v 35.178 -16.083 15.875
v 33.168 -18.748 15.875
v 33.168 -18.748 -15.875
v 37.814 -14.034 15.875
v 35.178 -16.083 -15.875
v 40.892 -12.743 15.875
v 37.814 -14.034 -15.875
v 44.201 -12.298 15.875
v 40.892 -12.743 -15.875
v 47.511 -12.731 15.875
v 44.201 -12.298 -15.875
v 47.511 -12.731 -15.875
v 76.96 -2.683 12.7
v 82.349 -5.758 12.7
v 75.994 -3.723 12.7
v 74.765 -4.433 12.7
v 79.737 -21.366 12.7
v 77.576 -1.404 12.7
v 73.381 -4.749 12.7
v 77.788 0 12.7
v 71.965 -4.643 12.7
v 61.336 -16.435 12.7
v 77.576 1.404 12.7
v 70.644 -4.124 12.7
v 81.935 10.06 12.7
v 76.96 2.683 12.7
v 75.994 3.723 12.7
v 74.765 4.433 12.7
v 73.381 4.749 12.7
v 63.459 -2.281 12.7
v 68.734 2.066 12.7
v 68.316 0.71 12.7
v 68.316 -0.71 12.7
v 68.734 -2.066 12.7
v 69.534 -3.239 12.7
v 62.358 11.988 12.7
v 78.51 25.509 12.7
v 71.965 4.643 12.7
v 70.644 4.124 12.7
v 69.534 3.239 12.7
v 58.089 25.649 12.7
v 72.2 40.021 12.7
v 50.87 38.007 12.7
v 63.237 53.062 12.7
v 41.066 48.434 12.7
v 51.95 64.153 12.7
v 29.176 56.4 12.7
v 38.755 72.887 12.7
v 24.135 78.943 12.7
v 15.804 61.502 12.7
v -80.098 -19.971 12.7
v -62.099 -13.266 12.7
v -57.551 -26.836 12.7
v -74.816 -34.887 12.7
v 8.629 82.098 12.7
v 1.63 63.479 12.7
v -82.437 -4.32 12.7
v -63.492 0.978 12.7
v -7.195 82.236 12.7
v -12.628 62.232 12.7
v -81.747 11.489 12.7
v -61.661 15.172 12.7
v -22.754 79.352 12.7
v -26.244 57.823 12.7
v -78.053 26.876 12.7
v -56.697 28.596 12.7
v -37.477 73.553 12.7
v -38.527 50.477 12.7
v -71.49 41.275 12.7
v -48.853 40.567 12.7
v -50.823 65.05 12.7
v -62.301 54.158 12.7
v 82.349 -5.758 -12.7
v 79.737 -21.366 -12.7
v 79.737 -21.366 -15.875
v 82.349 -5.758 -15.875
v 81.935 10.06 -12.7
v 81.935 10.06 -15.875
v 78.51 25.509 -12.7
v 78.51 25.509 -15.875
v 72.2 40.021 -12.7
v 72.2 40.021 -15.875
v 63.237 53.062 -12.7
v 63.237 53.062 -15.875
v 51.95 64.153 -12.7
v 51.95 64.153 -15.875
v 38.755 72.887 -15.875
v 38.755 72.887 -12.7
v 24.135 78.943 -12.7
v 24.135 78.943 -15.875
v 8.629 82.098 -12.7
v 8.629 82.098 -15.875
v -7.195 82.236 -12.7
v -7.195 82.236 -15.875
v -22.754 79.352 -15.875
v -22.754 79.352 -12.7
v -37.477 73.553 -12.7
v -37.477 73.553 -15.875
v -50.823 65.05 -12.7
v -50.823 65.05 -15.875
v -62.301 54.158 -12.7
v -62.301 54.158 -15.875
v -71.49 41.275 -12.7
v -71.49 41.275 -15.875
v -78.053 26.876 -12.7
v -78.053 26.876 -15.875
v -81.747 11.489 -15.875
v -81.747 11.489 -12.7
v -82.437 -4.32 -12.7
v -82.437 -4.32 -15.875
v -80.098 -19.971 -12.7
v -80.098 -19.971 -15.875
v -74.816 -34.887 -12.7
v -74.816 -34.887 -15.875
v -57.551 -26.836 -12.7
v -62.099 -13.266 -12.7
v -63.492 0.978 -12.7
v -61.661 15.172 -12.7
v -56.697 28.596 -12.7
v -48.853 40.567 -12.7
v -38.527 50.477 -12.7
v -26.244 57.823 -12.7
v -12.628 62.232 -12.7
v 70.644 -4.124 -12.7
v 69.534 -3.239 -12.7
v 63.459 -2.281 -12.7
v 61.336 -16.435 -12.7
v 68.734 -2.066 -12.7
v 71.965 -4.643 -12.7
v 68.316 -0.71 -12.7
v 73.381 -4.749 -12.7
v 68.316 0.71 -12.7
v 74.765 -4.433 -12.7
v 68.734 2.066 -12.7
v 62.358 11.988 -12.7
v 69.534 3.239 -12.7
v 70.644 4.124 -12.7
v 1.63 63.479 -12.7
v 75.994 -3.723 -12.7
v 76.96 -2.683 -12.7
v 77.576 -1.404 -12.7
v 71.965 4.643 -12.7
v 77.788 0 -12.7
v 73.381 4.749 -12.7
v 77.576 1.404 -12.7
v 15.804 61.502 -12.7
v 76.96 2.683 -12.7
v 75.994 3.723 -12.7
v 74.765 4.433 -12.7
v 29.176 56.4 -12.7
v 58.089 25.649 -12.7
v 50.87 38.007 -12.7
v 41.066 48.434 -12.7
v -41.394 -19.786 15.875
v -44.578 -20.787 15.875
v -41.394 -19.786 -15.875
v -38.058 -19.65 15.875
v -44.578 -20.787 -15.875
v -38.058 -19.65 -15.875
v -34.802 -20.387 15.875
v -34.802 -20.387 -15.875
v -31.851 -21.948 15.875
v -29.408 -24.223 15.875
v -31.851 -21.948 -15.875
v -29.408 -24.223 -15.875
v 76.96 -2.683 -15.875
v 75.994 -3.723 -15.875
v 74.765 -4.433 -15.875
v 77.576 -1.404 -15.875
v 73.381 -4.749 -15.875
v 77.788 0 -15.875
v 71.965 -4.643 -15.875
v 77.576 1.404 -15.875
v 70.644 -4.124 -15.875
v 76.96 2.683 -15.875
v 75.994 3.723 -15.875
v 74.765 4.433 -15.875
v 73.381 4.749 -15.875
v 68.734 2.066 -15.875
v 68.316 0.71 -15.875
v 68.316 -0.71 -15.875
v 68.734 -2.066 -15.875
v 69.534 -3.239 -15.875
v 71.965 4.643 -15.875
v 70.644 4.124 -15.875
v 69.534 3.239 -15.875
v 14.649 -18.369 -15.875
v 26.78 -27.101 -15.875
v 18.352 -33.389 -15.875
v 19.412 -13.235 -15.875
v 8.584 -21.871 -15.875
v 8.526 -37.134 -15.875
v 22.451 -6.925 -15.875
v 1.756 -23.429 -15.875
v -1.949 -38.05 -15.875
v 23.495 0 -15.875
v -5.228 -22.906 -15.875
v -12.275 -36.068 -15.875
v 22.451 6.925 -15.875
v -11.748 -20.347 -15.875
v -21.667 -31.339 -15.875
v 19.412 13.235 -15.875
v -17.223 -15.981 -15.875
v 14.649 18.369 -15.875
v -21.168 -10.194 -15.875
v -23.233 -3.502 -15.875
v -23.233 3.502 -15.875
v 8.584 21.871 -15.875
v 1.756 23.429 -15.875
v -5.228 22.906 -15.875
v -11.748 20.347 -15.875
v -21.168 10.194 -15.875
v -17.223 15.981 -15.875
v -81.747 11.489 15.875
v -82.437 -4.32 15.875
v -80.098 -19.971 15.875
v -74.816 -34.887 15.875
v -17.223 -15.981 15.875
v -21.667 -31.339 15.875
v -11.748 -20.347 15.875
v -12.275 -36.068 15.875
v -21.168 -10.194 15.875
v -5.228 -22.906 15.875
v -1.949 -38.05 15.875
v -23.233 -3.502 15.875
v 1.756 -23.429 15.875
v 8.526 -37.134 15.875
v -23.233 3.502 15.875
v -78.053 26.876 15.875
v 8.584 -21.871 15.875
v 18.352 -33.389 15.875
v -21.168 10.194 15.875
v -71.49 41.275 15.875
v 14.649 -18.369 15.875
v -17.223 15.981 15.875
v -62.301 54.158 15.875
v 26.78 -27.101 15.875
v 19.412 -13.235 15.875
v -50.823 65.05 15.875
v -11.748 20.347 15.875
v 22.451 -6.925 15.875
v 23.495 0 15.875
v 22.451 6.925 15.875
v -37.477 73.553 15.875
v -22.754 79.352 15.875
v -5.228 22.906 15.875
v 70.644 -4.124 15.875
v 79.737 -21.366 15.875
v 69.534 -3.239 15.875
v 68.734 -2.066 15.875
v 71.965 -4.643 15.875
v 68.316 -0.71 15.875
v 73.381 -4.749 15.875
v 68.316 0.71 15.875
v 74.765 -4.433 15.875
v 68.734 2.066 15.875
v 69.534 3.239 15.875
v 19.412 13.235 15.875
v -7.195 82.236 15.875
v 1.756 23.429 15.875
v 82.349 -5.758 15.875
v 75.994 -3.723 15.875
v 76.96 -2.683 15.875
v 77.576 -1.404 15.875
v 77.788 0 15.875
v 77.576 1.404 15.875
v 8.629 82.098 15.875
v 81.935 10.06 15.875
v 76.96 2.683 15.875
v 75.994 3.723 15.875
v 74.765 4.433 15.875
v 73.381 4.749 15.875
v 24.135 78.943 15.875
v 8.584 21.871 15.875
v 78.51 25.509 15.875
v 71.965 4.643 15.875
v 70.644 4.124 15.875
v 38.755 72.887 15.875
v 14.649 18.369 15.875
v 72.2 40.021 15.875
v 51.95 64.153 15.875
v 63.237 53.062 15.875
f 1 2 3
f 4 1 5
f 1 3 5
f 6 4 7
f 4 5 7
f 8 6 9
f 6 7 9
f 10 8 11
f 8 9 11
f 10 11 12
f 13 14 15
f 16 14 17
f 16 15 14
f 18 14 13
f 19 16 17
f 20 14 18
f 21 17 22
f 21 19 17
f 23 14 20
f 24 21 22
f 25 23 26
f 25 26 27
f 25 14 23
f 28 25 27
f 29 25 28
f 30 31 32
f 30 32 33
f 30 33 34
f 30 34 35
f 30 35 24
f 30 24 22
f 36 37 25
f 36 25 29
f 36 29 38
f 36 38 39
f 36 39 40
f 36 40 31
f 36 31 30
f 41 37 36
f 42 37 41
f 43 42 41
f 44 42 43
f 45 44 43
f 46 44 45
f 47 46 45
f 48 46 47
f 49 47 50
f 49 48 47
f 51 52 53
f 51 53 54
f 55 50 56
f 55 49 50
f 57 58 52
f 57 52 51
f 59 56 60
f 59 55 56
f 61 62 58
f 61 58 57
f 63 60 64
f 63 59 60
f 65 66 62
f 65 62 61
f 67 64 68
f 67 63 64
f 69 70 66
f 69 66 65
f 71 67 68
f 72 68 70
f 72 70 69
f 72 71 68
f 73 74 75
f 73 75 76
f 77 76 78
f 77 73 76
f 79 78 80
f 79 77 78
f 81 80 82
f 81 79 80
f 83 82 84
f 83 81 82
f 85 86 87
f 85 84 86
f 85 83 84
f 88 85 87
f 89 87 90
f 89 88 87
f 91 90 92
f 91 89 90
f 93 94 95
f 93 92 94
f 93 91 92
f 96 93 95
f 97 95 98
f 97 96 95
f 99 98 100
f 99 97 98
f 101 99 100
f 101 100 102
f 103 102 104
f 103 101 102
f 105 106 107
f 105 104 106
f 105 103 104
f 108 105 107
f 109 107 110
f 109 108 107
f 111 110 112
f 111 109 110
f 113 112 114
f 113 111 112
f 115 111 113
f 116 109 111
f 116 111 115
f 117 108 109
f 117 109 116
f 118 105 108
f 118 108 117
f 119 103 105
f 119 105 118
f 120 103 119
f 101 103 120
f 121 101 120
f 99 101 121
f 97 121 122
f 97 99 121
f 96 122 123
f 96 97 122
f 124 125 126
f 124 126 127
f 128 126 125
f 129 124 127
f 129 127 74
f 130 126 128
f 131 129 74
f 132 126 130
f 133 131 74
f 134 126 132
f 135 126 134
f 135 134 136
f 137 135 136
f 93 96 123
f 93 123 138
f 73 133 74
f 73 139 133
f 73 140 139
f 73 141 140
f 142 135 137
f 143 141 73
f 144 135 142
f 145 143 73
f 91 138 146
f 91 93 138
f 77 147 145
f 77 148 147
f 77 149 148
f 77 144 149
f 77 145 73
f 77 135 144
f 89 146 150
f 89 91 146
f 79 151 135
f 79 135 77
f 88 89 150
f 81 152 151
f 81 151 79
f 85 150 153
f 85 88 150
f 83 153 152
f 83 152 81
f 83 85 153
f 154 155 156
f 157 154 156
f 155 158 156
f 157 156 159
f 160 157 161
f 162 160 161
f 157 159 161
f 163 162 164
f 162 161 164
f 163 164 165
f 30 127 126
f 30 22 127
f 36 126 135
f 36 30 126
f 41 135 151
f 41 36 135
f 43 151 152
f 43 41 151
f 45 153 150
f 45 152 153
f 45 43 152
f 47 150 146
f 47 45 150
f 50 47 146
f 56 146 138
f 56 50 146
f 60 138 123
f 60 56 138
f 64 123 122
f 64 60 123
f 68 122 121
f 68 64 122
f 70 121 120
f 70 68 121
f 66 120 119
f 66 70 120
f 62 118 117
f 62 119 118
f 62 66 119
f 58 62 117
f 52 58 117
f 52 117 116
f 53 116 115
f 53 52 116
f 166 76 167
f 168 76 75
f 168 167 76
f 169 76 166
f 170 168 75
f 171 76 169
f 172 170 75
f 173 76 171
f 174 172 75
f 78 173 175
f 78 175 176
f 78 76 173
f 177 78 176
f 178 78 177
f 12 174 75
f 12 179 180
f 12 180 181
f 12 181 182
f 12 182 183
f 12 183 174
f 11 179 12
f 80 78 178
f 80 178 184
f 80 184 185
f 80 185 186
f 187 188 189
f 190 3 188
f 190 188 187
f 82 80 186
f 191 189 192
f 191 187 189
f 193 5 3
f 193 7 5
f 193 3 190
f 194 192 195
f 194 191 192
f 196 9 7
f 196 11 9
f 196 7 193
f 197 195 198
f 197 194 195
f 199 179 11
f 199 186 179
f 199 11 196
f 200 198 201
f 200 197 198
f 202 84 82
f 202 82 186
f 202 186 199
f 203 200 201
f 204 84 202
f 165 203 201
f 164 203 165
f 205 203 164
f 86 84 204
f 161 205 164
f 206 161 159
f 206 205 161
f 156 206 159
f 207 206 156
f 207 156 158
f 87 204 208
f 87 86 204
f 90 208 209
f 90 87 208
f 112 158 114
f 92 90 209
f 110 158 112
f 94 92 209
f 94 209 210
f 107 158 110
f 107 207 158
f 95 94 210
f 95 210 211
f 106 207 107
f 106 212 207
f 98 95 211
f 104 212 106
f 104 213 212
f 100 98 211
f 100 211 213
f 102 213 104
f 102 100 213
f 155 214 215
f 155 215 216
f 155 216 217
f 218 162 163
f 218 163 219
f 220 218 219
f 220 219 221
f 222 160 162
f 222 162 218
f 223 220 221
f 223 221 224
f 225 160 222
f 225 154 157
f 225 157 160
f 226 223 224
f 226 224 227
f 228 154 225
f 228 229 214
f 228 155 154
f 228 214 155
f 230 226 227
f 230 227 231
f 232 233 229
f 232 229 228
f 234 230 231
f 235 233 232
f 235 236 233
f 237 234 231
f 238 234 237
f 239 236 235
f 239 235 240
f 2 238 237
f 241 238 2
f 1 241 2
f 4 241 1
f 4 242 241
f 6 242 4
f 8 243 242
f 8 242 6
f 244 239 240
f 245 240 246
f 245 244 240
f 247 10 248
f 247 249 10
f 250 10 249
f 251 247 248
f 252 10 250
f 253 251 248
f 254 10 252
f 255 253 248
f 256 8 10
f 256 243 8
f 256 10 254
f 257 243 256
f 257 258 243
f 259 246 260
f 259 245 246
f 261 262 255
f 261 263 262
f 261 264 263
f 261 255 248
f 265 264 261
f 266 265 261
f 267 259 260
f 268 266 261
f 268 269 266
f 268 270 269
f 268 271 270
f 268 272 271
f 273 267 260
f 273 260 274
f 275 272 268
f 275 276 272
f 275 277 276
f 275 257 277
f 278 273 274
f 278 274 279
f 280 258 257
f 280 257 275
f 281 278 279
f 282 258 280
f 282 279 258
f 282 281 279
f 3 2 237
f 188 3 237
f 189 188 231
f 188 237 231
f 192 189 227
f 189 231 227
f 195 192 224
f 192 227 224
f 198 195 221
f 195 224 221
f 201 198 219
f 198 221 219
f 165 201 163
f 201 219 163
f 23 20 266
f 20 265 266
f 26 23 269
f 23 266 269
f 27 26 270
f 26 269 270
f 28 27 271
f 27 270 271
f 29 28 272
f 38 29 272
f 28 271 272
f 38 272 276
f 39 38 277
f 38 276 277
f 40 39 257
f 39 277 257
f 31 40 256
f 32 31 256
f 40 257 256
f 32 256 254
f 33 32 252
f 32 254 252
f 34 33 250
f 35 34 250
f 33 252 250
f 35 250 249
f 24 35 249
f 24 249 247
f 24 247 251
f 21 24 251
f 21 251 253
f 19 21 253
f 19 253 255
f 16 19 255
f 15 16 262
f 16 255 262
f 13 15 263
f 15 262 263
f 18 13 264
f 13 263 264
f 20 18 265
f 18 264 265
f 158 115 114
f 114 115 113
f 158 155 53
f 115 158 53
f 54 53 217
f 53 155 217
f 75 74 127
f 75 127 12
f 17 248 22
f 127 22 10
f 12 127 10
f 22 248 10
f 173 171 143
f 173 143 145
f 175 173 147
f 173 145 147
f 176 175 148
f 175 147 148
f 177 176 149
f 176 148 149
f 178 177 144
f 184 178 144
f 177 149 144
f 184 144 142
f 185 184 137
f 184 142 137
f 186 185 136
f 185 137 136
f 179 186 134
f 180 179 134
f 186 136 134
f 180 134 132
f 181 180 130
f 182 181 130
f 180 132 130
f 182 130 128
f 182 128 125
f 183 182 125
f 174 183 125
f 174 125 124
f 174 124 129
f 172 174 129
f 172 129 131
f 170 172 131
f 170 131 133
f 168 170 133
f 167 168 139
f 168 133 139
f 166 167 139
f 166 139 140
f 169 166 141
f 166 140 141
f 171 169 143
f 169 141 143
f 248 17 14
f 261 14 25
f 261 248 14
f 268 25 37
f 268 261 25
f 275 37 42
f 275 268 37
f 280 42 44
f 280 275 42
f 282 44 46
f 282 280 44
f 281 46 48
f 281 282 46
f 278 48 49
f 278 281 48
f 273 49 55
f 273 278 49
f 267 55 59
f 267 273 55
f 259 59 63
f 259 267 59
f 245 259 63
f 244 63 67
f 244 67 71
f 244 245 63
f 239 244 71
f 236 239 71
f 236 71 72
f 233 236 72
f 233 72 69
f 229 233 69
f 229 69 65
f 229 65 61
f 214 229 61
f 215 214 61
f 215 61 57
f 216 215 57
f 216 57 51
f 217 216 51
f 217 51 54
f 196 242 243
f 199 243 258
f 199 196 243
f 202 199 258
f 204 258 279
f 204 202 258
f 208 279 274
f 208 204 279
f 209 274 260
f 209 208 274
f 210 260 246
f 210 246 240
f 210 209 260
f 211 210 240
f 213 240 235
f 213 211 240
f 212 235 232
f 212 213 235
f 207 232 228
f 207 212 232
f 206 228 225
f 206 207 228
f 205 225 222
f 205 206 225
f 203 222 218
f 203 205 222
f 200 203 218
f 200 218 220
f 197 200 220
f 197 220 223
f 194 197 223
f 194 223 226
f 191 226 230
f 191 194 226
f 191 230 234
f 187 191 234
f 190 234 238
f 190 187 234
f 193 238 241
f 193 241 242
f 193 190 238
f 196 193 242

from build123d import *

# Parameters (mm, degrees)
F2_R     = 4.7625
F3_DEPTH = 50.8
F5_DEPTH = 31.751
F6_R     = 12.7


with BuildPart() as f1:
    # F0 (on Front) → F1 (revolve)
    with BuildSketch(Plane.XZ):
        Polygon((29.845, 15.875), (23.495, 15.875), (23.495, -15.875), (29.845, -15.875), (60.325, -15.875), (82.55, -15.875), (82.55, -12.7), (63.5, -12.7), (63.5, 12.7), (82.55, 12.7), (82.55, 15.875), (60.325, 15.875), align=None)
    revolve(axis=Axis((0, 0, 17.235907), (0, 0, 1)))

    # F2 (on Top) → F3 (cut, symmetric)
    with BuildSketch(Plane.XY):
        with Locations((73.025, 0)):
            Circle(F2_R)
    extrude(amount=F3_DEPTH, both=True, mode=Mode.SUBTRACT)

    # F4 (on face) → F5 (cut, through all)
    with BuildSketch(Plane.XY.offset(15.875)):
        with BuildLine():
            ThreePointArc((-74.815708, -34.887138), (7.194707, -82.235872), (79.737177, -21.365512))
            Line((79.737177, -21.365512), (36.801774, -9.861006))
            ThreePointArc((36.801774, -9.861006), (3.320634, -37.955018), (-34.530327, -16.101756))
            Line((-34.530327, -16.101756), (-74.815708, -34.887138))
        make_face()
    extrude(amount=-F5_DEPTH, mode=Mode.SUBTRACT)

    # F6
    f6_edges = [f1.edges().sort_by_distance(p)[0] for p in [
        (-34.530327, -16.101756, 0),
        (36.801774, -9.861006, 0),
    ]]
    fillet(f6_edges, radius=F6_R)


solid = f1.part
